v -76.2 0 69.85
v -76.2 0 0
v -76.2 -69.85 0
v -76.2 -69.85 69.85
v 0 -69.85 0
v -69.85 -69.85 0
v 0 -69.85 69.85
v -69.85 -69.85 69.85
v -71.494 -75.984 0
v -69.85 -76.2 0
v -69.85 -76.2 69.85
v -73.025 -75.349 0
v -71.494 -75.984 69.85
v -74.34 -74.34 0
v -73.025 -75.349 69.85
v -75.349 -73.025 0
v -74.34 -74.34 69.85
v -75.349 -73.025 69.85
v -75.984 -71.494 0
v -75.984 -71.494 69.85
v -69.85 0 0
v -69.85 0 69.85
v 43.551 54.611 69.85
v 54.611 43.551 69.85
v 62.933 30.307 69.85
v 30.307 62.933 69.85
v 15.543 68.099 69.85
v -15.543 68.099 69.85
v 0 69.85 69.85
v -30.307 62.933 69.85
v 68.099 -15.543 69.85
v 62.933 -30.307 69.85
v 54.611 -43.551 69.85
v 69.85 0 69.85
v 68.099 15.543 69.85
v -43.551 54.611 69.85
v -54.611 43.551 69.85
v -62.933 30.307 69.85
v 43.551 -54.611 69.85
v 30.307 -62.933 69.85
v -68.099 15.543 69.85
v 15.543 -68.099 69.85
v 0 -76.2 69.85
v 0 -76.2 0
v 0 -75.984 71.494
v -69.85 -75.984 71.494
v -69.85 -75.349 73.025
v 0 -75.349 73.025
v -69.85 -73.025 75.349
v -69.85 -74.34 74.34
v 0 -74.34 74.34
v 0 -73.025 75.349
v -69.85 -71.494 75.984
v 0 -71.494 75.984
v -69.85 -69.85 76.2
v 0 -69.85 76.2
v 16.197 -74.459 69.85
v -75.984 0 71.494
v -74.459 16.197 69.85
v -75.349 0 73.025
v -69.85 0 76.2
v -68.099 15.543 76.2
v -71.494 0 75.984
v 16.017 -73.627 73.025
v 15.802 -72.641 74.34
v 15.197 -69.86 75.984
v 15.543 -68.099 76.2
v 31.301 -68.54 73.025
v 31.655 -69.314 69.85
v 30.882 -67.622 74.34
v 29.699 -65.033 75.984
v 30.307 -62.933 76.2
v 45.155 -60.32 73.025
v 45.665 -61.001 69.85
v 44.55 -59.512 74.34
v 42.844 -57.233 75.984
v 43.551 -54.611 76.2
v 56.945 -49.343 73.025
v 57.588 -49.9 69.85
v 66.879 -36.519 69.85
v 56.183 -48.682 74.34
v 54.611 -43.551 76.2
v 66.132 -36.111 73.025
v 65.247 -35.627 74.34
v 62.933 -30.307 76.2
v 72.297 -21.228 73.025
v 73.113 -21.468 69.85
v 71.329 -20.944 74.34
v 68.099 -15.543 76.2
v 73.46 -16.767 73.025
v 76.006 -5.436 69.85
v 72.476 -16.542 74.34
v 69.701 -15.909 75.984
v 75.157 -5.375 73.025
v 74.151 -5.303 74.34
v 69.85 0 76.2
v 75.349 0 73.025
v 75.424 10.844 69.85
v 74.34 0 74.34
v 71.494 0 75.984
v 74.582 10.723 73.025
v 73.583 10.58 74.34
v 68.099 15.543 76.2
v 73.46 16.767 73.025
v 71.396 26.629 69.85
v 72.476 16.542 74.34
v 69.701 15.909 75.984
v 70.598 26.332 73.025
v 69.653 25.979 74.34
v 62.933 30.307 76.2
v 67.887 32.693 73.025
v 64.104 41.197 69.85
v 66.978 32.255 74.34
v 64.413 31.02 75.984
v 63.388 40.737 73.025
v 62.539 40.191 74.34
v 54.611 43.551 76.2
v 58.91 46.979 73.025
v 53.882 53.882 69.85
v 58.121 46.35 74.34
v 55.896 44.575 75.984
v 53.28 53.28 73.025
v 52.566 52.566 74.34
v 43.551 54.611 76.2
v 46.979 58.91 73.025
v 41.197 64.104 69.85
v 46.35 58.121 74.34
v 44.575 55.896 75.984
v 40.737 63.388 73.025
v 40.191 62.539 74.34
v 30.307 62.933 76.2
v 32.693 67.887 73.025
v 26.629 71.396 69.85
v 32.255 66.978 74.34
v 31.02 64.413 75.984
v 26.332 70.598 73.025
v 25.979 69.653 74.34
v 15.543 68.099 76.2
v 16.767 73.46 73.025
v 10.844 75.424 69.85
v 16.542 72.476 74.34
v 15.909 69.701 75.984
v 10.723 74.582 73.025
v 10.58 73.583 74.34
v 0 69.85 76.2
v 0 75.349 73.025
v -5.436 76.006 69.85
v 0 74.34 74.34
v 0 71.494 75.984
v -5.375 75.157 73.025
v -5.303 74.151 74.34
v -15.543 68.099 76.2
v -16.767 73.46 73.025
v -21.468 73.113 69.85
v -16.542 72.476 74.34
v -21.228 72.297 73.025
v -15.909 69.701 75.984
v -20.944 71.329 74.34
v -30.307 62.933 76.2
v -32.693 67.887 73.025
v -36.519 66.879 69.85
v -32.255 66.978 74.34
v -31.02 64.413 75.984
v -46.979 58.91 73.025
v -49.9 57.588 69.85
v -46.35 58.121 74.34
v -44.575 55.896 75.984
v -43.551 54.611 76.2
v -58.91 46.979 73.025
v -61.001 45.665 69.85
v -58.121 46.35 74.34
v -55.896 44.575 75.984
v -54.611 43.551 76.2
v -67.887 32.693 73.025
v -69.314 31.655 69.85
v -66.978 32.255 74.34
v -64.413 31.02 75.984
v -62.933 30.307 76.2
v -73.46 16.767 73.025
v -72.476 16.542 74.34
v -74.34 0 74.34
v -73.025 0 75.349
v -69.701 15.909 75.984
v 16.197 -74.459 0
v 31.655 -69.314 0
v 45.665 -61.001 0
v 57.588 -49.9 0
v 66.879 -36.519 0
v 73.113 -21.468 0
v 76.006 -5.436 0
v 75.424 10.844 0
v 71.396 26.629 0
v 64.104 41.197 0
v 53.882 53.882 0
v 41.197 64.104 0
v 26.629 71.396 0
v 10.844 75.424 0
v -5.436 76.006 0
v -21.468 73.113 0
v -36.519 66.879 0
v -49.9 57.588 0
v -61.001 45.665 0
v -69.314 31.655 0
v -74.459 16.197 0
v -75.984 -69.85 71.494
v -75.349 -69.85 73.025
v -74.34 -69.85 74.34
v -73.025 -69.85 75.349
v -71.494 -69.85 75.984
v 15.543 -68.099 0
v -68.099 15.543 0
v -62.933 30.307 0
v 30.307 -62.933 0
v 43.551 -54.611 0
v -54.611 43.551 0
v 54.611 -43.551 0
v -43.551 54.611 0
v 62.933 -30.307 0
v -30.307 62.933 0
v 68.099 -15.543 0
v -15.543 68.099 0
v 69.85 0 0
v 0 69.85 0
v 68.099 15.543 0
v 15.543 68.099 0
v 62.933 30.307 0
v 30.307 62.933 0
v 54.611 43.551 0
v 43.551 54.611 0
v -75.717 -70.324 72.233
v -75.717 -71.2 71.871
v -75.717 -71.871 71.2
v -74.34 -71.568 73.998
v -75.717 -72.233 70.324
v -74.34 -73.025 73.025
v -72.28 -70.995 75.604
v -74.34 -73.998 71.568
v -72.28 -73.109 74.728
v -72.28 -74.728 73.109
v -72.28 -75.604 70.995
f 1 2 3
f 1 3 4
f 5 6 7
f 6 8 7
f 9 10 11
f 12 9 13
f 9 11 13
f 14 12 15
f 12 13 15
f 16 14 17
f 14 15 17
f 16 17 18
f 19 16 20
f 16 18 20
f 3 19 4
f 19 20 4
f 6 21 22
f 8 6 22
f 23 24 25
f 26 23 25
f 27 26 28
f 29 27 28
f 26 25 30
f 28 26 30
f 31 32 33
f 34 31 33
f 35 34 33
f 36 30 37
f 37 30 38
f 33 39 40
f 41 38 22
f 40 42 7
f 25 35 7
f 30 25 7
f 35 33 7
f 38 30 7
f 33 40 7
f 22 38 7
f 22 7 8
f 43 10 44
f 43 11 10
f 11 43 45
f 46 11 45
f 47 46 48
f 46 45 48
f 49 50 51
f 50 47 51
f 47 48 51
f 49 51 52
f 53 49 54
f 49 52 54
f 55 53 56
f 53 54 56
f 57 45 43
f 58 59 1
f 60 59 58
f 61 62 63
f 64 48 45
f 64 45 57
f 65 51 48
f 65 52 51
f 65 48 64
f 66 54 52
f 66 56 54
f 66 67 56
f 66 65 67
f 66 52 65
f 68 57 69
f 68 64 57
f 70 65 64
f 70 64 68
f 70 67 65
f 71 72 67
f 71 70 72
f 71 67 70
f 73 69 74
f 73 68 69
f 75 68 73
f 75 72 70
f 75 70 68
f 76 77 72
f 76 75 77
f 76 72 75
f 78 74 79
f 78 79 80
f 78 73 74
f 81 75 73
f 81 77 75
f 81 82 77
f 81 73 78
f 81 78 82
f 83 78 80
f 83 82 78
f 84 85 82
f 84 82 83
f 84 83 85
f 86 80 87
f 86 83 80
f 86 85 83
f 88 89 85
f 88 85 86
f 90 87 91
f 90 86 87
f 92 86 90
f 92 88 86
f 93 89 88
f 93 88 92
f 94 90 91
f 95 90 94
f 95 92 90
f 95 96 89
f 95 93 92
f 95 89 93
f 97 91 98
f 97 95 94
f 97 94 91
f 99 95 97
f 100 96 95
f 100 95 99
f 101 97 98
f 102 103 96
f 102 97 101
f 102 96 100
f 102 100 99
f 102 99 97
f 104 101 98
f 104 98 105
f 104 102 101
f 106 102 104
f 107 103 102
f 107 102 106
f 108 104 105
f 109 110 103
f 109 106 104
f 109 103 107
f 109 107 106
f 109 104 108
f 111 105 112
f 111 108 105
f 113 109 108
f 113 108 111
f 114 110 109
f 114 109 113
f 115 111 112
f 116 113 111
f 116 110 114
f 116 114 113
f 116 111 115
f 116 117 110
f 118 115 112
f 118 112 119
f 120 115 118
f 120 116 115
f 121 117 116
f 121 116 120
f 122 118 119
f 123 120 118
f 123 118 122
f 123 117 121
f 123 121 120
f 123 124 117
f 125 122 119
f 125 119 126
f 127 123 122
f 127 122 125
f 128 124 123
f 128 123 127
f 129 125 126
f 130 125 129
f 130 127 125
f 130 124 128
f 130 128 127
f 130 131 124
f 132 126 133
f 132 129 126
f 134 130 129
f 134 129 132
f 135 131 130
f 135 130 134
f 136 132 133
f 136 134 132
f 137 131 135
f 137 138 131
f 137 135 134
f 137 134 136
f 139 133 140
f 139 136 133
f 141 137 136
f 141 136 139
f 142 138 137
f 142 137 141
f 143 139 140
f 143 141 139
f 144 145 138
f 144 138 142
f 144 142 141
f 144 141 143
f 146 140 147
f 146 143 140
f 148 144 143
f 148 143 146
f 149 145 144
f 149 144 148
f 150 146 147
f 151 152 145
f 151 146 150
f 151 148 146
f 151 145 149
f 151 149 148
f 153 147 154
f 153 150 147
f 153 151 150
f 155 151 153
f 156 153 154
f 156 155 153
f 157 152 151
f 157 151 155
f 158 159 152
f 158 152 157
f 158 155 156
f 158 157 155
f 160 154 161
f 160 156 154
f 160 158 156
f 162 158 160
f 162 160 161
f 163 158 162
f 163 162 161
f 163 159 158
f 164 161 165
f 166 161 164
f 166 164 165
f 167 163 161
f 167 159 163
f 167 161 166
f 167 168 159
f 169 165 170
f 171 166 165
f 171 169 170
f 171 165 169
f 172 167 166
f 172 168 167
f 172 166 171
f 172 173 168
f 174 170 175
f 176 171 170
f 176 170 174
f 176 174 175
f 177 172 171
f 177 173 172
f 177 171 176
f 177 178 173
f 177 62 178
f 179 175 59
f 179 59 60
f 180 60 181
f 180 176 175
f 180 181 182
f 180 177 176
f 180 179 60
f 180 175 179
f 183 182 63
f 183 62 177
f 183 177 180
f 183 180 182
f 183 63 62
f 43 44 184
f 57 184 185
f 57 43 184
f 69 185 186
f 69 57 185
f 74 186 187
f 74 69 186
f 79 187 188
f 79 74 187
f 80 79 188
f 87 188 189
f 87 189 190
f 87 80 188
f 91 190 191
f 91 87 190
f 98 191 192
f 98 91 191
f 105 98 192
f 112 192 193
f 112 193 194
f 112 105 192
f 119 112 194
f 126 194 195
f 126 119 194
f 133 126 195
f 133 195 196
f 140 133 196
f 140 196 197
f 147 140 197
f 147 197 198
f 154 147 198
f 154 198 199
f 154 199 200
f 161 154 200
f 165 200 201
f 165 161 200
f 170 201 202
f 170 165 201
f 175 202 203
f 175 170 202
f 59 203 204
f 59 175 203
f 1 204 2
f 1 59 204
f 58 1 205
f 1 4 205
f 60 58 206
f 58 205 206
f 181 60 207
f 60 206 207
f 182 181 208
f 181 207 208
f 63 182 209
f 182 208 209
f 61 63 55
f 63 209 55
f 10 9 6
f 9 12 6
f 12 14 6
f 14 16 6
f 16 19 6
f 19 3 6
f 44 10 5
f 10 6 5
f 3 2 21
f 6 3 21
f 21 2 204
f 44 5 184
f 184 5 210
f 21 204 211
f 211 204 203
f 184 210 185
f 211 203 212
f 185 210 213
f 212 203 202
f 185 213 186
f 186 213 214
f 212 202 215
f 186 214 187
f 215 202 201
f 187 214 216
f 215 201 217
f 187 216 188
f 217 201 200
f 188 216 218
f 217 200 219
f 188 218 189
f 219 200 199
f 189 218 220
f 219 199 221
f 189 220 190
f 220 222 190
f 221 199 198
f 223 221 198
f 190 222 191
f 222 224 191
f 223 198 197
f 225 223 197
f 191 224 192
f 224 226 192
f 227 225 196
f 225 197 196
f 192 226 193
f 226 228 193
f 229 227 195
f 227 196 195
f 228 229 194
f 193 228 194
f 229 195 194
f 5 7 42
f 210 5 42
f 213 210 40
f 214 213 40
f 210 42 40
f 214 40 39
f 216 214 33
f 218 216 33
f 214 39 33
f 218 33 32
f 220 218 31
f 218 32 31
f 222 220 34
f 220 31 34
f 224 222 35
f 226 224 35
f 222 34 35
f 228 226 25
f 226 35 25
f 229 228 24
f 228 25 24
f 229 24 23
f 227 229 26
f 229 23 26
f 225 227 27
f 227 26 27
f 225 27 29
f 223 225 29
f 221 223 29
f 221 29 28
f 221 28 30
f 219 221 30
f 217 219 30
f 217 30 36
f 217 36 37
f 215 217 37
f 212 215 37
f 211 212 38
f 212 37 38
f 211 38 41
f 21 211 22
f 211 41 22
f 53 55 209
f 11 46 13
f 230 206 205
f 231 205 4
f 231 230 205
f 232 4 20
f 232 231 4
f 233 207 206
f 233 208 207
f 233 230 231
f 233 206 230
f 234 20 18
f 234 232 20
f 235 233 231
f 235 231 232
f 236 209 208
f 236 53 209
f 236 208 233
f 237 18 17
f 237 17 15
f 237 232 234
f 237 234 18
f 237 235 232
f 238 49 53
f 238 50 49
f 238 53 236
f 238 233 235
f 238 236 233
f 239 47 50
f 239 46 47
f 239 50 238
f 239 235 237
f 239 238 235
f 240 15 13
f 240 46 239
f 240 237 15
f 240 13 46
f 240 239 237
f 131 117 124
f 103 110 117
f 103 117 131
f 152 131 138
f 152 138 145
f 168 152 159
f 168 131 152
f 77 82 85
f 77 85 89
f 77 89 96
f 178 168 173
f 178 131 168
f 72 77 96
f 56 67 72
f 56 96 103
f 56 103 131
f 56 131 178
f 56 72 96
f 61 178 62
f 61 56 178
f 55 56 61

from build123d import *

# Parameters (mm, degrees)
F0_W     = 76.2
F0_H     = 76.2
F1_DEPTH = 76.2
F3_R     = 6.35
F4_T     = 6.35


# Not quite as in the source:
# - a shell that OpenCascade refuses in one call is made with other operations: the cavity is built on its own and cut out


with BuildPart() as f1:
    # F0 (on Front) → F1 (new body)
    with BuildSketch(Plane.XZ):
        with Locations((-38.1, 38.1)):
            Rectangle(F0_W, F0_H)
    extrude(amount=F1_DEPTH)

    # F0 (on Front) → F2 (revolve)
    with BuildSketch(Plane.XZ):
        with Locations((-38.1, 38.1)):
            Rectangle(F0_W, F0_H)
    revolve(axis=Axis((0, 0, 38.1), (0, 0, 1)))

    # F3
    f3_edges = [f1.edges().sort_by_distance(p)[0] for p in [
        (-76.2, -38.1, 76.2),
        (-76.2, -76.2, 38.1),
    ]]
    fillet(f3_edges, radius=F3_R)

    # F4: shell of thickness 6.35, made by hand


with BuildPart() as f4_core1:
    # F4_t2: copy of F1
    add(f1.part)

    # the walls: a layer under each face that stays
    f4_faces = [f4_core1.faces().sort_by_distance(p)[0] for p in [
        (-34.925, -76.2, 34.925),
        (53.8815367264, 53.8815367264, 34.925),
        (-76.2, -34.925, 34.925),
        (0, 0, 76.2),
    ]]
    thicken(f4_faces, amount=-F4_T, mode=Mode.SUBTRACT)


with BuildPart() as f1_1:
    add(f1.part)

    # what is left inside the walls is the cavity
    f4_cavity = [f4_core1.part.solids().sort_by_distance(p)[0] for p in [
        (49.346507, 49.346507, 46.566667),
    ]]
    add(f4_cavity, mode=Mode.SUBTRACT)


solid = f1_1.part
